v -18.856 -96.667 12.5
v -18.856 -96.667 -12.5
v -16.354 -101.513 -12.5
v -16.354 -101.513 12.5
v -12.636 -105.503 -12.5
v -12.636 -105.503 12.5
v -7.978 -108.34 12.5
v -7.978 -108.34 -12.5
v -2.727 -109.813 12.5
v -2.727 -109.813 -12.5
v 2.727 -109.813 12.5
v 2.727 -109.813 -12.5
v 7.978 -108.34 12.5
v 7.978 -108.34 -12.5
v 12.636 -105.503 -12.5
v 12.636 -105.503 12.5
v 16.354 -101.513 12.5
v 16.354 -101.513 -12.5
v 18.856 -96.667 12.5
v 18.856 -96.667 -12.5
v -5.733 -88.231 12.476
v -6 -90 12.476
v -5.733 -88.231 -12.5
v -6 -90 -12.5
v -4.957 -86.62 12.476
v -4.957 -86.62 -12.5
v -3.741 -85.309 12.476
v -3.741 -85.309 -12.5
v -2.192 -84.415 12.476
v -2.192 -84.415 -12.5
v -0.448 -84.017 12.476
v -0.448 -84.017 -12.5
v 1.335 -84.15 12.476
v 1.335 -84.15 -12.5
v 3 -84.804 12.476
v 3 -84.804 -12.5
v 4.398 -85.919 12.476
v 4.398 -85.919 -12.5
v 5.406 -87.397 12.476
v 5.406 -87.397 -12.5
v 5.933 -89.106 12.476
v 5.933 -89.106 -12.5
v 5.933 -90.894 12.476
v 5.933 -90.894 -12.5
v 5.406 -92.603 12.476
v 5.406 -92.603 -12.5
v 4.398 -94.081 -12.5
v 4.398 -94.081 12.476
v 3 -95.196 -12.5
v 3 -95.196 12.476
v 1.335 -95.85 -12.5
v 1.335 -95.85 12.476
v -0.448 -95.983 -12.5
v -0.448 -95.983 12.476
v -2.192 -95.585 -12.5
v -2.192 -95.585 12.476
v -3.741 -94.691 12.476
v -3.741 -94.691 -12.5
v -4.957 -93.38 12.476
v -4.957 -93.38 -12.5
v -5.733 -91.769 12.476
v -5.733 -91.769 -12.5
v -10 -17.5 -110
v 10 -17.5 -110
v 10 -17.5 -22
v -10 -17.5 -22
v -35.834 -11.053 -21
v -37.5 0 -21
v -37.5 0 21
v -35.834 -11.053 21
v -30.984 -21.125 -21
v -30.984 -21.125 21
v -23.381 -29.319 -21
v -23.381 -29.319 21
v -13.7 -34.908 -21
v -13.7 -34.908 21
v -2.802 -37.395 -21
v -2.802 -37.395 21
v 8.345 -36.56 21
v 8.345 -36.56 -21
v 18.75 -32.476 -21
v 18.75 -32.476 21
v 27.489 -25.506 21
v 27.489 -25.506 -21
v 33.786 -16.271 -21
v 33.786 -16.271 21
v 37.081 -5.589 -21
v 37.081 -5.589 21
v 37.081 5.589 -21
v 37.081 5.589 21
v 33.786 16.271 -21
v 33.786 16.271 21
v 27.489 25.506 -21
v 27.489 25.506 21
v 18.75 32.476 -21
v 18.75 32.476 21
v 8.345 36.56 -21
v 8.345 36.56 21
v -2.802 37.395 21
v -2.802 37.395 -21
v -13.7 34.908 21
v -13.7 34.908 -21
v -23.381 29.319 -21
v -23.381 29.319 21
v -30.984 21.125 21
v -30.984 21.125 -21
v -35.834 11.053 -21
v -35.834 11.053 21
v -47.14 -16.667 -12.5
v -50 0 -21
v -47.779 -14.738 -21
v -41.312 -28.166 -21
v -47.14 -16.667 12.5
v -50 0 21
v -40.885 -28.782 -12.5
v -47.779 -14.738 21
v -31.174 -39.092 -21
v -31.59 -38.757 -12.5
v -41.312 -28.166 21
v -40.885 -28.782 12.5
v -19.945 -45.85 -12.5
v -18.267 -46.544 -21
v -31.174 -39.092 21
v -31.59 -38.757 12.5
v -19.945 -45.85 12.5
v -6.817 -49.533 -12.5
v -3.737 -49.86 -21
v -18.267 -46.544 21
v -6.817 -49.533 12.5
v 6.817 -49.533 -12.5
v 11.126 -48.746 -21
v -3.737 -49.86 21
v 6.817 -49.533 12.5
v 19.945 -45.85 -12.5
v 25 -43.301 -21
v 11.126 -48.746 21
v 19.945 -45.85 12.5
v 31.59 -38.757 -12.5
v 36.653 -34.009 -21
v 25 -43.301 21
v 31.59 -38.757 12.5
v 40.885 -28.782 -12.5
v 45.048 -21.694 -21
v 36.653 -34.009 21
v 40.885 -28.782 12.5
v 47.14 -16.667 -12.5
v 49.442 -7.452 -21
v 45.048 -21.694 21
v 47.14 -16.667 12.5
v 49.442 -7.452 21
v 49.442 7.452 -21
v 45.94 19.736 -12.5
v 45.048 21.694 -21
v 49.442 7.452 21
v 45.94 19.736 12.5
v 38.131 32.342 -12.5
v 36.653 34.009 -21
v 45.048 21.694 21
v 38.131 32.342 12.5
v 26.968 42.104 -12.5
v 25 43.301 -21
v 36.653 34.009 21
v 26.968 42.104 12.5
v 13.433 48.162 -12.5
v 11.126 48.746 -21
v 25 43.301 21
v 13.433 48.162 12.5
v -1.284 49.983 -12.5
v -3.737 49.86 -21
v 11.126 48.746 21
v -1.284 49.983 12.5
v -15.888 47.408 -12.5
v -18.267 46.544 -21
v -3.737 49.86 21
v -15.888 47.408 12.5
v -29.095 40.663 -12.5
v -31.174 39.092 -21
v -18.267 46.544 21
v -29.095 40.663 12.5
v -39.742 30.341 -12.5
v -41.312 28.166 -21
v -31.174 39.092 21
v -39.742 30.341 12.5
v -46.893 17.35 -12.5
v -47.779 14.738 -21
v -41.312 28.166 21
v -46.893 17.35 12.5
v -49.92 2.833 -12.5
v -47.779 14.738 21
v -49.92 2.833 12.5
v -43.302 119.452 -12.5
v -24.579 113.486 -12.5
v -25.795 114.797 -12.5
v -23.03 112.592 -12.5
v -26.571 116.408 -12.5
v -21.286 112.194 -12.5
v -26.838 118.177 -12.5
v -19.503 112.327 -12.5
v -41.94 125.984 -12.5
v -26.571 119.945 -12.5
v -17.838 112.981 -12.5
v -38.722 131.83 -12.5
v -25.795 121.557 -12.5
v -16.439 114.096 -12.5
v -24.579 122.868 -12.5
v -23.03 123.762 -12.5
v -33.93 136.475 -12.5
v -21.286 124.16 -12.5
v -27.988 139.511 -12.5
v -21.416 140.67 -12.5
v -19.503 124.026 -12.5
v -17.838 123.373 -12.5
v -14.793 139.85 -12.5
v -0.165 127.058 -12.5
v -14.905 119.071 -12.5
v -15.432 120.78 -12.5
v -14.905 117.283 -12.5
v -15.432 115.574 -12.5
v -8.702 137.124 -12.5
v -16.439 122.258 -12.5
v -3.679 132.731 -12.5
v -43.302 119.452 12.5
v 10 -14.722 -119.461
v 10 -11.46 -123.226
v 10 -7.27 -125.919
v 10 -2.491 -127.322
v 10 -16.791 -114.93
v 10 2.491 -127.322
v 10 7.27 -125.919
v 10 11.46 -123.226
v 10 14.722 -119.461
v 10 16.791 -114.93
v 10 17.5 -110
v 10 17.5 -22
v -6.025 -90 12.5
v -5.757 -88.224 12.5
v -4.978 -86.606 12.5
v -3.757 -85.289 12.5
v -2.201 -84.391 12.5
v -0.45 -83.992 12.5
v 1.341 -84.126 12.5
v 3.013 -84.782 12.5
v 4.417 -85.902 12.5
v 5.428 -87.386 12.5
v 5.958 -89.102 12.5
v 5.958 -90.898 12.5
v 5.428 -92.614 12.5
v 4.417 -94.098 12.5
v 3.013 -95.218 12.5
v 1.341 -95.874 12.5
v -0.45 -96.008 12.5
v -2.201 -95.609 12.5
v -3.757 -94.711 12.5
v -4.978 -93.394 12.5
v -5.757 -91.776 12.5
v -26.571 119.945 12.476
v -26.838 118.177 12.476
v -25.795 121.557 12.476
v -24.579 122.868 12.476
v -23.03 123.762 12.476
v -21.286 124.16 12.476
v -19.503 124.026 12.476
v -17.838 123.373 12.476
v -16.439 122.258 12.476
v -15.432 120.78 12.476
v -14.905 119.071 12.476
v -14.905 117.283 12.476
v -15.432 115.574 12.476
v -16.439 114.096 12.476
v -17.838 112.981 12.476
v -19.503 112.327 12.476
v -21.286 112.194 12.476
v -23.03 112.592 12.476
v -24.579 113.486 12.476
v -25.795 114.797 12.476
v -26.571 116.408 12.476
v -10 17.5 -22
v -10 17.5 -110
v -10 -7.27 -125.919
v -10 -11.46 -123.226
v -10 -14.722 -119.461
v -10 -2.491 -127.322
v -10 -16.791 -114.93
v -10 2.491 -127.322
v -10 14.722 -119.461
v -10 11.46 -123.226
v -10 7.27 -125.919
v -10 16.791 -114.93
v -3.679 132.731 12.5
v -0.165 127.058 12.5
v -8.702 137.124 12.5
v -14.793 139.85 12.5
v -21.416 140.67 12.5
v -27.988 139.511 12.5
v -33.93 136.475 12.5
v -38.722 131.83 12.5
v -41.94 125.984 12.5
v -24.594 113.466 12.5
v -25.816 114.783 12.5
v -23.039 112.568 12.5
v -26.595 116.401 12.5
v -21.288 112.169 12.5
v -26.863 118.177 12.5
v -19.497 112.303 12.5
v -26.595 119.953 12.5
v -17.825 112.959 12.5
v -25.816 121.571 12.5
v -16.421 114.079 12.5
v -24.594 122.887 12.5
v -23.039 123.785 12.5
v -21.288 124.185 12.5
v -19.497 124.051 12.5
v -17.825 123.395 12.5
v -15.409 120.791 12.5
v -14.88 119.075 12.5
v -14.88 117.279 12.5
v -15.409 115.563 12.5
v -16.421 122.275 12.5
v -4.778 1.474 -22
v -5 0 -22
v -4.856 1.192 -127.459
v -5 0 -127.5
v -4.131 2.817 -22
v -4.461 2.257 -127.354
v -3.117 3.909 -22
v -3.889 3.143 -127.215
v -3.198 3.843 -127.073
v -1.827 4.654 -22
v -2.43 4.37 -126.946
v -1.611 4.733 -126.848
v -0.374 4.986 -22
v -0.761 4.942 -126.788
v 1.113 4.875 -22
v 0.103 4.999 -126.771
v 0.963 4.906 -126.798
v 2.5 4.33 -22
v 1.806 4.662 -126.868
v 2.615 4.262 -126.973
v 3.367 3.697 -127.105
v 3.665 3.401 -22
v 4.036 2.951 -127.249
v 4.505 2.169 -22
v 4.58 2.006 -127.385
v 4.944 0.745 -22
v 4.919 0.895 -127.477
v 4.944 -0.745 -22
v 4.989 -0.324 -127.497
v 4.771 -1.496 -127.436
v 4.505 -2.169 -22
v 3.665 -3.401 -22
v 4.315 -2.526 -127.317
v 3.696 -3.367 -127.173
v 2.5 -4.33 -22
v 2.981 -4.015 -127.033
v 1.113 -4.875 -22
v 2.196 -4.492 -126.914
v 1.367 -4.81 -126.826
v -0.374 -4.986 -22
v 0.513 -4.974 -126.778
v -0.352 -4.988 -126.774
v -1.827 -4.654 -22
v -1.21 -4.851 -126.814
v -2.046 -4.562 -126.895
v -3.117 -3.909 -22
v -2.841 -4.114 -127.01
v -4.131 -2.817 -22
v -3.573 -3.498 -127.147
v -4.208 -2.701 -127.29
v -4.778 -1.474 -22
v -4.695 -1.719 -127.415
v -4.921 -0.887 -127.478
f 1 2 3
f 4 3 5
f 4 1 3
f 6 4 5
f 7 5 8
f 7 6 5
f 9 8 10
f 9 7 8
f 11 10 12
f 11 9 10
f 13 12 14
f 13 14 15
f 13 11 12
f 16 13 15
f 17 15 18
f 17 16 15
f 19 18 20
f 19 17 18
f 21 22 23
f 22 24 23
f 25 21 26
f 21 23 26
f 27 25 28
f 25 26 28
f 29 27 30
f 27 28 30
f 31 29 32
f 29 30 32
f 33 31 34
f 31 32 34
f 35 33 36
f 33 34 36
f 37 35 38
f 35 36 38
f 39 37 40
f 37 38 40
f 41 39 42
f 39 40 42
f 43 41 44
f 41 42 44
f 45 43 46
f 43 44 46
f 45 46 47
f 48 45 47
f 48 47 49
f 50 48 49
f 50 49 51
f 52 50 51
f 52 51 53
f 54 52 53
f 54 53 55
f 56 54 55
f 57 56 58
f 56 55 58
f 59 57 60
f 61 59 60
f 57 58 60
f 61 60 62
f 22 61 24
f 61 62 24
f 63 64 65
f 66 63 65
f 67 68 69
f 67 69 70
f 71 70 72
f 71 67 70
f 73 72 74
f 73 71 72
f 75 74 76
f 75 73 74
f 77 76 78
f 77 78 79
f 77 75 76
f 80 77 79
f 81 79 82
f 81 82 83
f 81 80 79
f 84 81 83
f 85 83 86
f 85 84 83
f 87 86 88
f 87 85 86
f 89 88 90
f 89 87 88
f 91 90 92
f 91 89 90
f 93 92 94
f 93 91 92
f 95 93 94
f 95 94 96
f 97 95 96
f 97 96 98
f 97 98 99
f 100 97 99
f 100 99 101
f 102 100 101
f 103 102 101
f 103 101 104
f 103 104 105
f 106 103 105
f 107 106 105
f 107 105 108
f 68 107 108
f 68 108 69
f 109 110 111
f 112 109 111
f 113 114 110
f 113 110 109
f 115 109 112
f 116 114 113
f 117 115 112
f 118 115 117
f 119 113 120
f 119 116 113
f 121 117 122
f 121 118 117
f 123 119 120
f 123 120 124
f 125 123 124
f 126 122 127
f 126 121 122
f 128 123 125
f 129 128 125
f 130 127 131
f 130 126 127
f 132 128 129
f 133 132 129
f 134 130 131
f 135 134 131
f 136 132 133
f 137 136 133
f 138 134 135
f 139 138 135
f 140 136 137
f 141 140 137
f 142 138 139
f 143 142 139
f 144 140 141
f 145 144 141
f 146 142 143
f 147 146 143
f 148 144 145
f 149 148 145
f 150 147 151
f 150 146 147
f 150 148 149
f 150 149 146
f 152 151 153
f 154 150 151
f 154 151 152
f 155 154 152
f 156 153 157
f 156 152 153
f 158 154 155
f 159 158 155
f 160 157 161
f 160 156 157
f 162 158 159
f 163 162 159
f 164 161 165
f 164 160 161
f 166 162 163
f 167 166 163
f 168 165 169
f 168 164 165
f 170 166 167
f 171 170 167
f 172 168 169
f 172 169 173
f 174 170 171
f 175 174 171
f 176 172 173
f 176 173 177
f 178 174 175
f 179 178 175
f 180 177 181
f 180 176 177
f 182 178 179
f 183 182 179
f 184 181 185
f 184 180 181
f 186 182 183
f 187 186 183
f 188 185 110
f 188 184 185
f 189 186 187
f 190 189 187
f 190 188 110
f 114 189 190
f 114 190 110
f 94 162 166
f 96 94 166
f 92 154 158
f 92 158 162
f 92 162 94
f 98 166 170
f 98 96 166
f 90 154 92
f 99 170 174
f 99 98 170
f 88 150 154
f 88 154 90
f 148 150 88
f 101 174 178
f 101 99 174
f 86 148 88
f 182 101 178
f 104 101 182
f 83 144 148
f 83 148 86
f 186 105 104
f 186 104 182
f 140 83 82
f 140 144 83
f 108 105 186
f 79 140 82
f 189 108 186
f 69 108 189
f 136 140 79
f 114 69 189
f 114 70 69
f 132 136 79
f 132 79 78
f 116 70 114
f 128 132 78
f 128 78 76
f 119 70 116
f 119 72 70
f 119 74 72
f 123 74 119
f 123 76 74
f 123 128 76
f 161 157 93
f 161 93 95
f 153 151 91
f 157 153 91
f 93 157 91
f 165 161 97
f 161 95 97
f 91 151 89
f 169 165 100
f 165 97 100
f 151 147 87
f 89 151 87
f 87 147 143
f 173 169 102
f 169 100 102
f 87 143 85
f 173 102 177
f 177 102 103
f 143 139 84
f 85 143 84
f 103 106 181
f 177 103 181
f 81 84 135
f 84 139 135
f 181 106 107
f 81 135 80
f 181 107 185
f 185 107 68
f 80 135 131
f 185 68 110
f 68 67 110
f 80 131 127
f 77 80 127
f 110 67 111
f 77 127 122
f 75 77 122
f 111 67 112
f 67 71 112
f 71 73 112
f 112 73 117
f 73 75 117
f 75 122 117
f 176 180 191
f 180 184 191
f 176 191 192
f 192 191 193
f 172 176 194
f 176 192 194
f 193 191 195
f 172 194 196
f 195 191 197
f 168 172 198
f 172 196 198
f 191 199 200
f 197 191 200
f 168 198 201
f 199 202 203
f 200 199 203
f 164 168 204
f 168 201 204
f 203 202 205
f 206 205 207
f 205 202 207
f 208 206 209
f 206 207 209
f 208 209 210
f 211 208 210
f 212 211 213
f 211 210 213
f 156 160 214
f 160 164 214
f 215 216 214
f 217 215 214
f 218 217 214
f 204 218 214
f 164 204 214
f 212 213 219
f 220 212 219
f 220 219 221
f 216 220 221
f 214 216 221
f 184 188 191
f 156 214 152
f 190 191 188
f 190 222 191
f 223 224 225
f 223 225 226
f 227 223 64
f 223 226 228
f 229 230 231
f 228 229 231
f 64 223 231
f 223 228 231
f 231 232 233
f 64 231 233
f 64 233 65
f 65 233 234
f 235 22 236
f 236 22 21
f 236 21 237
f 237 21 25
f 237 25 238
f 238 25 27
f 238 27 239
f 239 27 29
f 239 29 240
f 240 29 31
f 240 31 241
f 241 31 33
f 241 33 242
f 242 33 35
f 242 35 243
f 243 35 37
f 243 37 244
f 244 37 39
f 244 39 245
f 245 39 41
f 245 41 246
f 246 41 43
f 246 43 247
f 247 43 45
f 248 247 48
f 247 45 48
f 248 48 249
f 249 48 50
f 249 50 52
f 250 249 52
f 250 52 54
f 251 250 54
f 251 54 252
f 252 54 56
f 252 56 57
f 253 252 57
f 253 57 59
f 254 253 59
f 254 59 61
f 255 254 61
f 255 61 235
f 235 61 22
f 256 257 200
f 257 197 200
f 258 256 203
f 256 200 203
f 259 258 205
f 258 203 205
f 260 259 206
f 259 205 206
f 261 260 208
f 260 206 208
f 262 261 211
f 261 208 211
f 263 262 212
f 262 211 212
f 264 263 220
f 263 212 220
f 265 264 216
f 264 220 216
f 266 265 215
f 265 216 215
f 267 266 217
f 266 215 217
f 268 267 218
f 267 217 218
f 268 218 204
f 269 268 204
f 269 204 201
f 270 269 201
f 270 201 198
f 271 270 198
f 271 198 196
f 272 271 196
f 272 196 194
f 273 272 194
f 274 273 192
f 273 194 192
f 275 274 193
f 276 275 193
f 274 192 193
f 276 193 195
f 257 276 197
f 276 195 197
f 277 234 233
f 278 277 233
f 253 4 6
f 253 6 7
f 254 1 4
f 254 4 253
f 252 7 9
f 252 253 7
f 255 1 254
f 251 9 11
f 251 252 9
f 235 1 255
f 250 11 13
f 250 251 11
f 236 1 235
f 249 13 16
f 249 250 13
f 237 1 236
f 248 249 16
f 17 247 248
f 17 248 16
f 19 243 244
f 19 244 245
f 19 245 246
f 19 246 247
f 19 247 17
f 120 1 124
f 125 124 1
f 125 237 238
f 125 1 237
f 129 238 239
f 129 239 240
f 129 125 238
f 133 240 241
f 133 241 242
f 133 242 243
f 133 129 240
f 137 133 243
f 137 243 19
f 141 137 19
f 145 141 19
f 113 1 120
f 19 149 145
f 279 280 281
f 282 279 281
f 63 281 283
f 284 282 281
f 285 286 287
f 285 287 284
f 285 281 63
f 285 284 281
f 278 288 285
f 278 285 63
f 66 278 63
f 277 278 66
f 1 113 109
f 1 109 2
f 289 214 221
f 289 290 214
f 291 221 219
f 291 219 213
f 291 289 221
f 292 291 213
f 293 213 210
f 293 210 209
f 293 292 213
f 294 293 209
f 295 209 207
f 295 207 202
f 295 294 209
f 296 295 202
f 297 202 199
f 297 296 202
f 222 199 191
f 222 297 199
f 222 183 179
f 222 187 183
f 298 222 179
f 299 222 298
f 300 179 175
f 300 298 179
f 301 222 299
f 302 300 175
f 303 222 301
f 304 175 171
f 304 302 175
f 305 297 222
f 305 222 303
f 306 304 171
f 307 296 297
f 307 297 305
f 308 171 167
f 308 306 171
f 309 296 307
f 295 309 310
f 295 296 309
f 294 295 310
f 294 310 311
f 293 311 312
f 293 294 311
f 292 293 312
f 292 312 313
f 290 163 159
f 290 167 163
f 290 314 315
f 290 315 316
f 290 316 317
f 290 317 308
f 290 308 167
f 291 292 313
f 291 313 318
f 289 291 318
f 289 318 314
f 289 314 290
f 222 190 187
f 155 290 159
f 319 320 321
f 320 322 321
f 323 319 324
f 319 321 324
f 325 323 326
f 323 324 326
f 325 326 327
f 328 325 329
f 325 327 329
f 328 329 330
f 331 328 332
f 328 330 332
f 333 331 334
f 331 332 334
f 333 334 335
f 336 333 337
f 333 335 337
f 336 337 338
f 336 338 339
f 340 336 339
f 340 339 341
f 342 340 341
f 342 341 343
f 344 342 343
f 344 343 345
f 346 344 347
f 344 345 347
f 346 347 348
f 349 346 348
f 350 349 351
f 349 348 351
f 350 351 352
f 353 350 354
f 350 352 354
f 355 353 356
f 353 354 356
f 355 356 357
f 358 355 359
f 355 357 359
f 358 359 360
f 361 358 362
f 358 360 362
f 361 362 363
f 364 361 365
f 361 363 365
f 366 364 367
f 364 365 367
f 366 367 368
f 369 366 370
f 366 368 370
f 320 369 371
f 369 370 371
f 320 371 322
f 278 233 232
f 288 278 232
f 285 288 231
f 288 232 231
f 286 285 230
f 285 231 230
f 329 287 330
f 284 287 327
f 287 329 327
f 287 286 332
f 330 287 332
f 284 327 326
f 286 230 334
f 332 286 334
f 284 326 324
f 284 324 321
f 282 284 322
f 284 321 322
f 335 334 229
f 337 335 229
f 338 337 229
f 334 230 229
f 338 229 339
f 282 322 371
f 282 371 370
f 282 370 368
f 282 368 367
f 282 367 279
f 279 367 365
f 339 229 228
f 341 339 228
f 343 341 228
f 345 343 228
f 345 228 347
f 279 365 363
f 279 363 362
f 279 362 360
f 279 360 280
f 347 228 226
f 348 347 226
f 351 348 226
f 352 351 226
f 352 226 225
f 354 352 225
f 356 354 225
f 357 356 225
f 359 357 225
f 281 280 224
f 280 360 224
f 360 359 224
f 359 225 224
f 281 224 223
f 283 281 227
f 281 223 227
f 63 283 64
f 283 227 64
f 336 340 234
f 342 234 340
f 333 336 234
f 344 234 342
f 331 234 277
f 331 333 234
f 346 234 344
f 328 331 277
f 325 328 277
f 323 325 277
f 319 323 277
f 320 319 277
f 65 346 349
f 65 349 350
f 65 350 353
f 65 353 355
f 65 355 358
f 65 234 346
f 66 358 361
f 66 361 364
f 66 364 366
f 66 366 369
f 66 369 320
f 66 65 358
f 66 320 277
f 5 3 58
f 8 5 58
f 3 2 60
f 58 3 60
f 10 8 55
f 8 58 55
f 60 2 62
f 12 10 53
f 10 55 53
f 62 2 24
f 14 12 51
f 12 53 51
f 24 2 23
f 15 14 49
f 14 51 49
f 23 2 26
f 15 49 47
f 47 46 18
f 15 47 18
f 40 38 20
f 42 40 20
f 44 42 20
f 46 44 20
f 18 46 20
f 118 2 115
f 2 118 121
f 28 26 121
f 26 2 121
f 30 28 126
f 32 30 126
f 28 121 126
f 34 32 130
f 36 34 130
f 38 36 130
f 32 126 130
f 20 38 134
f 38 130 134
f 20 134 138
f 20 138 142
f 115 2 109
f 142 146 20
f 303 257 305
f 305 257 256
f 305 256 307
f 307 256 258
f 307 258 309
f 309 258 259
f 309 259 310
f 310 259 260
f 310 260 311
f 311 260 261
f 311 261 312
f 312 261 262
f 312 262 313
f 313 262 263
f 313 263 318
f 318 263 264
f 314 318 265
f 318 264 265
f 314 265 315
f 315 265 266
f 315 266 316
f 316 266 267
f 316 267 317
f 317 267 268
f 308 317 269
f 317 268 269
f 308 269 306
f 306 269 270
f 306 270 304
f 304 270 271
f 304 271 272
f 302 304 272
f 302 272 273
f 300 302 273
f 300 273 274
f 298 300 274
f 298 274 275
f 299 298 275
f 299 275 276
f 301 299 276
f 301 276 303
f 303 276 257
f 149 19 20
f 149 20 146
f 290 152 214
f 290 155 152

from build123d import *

# Parameters (mm, degrees)
IZIM1_R                         = 50
IZIM1_R_2                       = 37.5
Y_KSEKLIK_EKSTR_ZYON1_DEPTH     = 21
Y_KSEKLIK_EKSTR_ZYON2_DEPTH     = 12.5
Y_KSEKLIK_EKSTR_ZYON6_DEPTH     = 10
F_12_0_12_AP_DELIK2_D           = 12
F_12_0_12_AP_DELIK2_CSINK_D     = 12.05
F_12_0_12_AP_DELIK2_CSINK_ANGLE = 92
F_10_0_10_AP_DELIK1_D           = 10
F_10_0_10_AP_DELIK1_CSINK_D     = 10.05
F_10_0_10_AP_DELIK1_CSINK_ANGLE = 92
KES_EKSTR_ZYON2_DEPTH           = 197.331986088
KES_EKSTR_ZYON2_DEPTH_BACK      = 21
IZIM8_R                         = 37.5
KES_EKSTR_ZYON4_DEPTH           = 197.331986088
KES_EKSTR_ZYON4_DEPTH_BACK      = 22
IZIM9_R                         = 37.5


with BuildPart() as part:
    # Çizim1 → Yükseklik-Ekstrüzyon1 (new, symmetric)
    with BuildSketch(Plane.XY):
        with Locations(Location((0, 0, 0), (0, 0, 180))):
            Circle(IZIM1_R)
        with Locations(Location((0, 0, 0), (0, 0, 180))):
            Circle(IZIM1_R_2, mode=Mode.SUBTRACT)
    extrude(amount=Y_KSEKLIK_EKSTR_ZYON1_DEPTH, both=True)

    # Çizim2 → Yükseklik-Ekstrüzyon2 (add, symmetric)
    with BuildSketch(Plane.XY):
        with BuildLine():
            Line((-43.301638089, 119.45173979), (-49.919681708, 2.832909841))
            ThreePointArc((-49.919681708, 2.832909841), (-49.499755188, -7.055085847), (-47.140452079, -16.666666667))
            Line((-47.140452079, -16.666666667), (-18.856180832, -96.666666667))
            ThreePointArc((-18.856180832, -96.666666667), (0, -110), (18.856180832, -96.666666667))
            Line((18.856180832, -96.666666667), (47.140452079, -16.666666667))
            ThreePointArc((47.140452079, -16.666666667), (49.972845482, 1.647639043), (45.940244303, 19.735601166))
            Line((45.940244303, 19.735601166), (-0.164671384, 127.057950886))
            ThreePointArc((-0.164671384, 127.057950886), (-24.744865318, 140.335104804), (-43.301638089, 119.45173979))
        make_face()
    extrude(amount=Y_KSEKLIK_EKSTR_ZYON2_DEPTH, both=True)

    # Çizim3 → Yükseklik-Ekstrüzyon6 (add, symmetric)
    with BuildSketch(Plane(origin=(0, 0, 0), x_dir=(0, 0, -1), z_dir=(1, 0, 0))):
        with BuildLine():
            Line((110, -17.5), (5.069368948, -17.5))
            Line((5.069368948, -17.5), (5.069368948, 17.5))
            Line((5.069368948, 17.5), (110, 17.5))
            ThreePointArc((110, 17.5), (127.5, 0), (110, -17.5))
        make_face()
    extrude(amount=Y_KSEKLIK_EKSTR_ZYON6_DEPTH, both=True)

    # Ø12.0 (12) Çap Delik2 (through all)
    with Locations(Plane(origin=(-20.83778132, 118.176930361, 12.5), x_dir=(1, 0, 0), z_dir=(0, 0, 1))):
        with Locations((0, 0), (20.83778132, -208.176930361)):
            CounterSinkHole(F_12_0_12_AP_DELIK2_D / 2, F_12_0_12_AP_DELIK2_CSINK_D / 2, counter_sink_angle=F_12_0_12_AP_DELIK2_CSINK_ANGLE)

    # Ø10.0 (10) Çap Delik1 (through all)
    with Locations(Plane.XY.offset(21)):
        with Locations((0, 0)):
            CounterSinkHole(F_10_0_10_AP_DELIK1_D / 2, F_10_0_10_AP_DELIK1_CSINK_D / 2, counter_sink_angle=F_10_0_10_AP_DELIK1_CSINK_ANGLE)

    # Çizim8 → Kes-Ekstrüzyon2 (cut, two sides: drawn at the far end of the back side and taken through both)
    with BuildSketch(Plane.XY.offset(-KES_EKSTR_ZYON2_DEPTH_BACK)):
        with Locations(Location((0, 0, 0), (0, 0, 180))):
            Circle(IZIM8_R)
    extrude(amount=KES_EKSTR_ZYON2_DEPTH + KES_EKSTR_ZYON2_DEPTH_BACK, mode=Mode.SUBTRACT)


with BuildPart() as kes_ekstr_zyon2_piece_1:
    # of the separate pieces the step leaves, piece 1, a body of its own (kes_ekstr_zyon2_pieces)
    add(part.part.solids().sort_by_distance((-50, 0, -21))[0])


with BuildPart() as kes_ekstr_zyon2_piece_2:
    # of the separate pieces the step leaves, piece 2, a body of its own (kes_ekstr_zyon2_pieces)
    add(part.part.solids().sort_by_distance((10, 17.5, -21))[0])

    # Çizim9 → Kes-Ekstrüzyon4 (cut, two sides: drawn at the far end of the back side and taken through both)
    with BuildSketch(Plane.XY.offset(-KES_EKSTR_ZYON4_DEPTH_BACK)):
        with Locations(Location((0, 0, 0), (0, 0, 180))):
            Circle(IZIM9_R)
    extrude(amount=KES_EKSTR_ZYON4_DEPTH + KES_EKSTR_ZYON4_DEPTH_BACK, mode=Mode.SUBTRACT)


solid = Compound([kes_ekstr_zyon2_piece_1.part, kes_ekstr_zyon2_piece_2.part])
